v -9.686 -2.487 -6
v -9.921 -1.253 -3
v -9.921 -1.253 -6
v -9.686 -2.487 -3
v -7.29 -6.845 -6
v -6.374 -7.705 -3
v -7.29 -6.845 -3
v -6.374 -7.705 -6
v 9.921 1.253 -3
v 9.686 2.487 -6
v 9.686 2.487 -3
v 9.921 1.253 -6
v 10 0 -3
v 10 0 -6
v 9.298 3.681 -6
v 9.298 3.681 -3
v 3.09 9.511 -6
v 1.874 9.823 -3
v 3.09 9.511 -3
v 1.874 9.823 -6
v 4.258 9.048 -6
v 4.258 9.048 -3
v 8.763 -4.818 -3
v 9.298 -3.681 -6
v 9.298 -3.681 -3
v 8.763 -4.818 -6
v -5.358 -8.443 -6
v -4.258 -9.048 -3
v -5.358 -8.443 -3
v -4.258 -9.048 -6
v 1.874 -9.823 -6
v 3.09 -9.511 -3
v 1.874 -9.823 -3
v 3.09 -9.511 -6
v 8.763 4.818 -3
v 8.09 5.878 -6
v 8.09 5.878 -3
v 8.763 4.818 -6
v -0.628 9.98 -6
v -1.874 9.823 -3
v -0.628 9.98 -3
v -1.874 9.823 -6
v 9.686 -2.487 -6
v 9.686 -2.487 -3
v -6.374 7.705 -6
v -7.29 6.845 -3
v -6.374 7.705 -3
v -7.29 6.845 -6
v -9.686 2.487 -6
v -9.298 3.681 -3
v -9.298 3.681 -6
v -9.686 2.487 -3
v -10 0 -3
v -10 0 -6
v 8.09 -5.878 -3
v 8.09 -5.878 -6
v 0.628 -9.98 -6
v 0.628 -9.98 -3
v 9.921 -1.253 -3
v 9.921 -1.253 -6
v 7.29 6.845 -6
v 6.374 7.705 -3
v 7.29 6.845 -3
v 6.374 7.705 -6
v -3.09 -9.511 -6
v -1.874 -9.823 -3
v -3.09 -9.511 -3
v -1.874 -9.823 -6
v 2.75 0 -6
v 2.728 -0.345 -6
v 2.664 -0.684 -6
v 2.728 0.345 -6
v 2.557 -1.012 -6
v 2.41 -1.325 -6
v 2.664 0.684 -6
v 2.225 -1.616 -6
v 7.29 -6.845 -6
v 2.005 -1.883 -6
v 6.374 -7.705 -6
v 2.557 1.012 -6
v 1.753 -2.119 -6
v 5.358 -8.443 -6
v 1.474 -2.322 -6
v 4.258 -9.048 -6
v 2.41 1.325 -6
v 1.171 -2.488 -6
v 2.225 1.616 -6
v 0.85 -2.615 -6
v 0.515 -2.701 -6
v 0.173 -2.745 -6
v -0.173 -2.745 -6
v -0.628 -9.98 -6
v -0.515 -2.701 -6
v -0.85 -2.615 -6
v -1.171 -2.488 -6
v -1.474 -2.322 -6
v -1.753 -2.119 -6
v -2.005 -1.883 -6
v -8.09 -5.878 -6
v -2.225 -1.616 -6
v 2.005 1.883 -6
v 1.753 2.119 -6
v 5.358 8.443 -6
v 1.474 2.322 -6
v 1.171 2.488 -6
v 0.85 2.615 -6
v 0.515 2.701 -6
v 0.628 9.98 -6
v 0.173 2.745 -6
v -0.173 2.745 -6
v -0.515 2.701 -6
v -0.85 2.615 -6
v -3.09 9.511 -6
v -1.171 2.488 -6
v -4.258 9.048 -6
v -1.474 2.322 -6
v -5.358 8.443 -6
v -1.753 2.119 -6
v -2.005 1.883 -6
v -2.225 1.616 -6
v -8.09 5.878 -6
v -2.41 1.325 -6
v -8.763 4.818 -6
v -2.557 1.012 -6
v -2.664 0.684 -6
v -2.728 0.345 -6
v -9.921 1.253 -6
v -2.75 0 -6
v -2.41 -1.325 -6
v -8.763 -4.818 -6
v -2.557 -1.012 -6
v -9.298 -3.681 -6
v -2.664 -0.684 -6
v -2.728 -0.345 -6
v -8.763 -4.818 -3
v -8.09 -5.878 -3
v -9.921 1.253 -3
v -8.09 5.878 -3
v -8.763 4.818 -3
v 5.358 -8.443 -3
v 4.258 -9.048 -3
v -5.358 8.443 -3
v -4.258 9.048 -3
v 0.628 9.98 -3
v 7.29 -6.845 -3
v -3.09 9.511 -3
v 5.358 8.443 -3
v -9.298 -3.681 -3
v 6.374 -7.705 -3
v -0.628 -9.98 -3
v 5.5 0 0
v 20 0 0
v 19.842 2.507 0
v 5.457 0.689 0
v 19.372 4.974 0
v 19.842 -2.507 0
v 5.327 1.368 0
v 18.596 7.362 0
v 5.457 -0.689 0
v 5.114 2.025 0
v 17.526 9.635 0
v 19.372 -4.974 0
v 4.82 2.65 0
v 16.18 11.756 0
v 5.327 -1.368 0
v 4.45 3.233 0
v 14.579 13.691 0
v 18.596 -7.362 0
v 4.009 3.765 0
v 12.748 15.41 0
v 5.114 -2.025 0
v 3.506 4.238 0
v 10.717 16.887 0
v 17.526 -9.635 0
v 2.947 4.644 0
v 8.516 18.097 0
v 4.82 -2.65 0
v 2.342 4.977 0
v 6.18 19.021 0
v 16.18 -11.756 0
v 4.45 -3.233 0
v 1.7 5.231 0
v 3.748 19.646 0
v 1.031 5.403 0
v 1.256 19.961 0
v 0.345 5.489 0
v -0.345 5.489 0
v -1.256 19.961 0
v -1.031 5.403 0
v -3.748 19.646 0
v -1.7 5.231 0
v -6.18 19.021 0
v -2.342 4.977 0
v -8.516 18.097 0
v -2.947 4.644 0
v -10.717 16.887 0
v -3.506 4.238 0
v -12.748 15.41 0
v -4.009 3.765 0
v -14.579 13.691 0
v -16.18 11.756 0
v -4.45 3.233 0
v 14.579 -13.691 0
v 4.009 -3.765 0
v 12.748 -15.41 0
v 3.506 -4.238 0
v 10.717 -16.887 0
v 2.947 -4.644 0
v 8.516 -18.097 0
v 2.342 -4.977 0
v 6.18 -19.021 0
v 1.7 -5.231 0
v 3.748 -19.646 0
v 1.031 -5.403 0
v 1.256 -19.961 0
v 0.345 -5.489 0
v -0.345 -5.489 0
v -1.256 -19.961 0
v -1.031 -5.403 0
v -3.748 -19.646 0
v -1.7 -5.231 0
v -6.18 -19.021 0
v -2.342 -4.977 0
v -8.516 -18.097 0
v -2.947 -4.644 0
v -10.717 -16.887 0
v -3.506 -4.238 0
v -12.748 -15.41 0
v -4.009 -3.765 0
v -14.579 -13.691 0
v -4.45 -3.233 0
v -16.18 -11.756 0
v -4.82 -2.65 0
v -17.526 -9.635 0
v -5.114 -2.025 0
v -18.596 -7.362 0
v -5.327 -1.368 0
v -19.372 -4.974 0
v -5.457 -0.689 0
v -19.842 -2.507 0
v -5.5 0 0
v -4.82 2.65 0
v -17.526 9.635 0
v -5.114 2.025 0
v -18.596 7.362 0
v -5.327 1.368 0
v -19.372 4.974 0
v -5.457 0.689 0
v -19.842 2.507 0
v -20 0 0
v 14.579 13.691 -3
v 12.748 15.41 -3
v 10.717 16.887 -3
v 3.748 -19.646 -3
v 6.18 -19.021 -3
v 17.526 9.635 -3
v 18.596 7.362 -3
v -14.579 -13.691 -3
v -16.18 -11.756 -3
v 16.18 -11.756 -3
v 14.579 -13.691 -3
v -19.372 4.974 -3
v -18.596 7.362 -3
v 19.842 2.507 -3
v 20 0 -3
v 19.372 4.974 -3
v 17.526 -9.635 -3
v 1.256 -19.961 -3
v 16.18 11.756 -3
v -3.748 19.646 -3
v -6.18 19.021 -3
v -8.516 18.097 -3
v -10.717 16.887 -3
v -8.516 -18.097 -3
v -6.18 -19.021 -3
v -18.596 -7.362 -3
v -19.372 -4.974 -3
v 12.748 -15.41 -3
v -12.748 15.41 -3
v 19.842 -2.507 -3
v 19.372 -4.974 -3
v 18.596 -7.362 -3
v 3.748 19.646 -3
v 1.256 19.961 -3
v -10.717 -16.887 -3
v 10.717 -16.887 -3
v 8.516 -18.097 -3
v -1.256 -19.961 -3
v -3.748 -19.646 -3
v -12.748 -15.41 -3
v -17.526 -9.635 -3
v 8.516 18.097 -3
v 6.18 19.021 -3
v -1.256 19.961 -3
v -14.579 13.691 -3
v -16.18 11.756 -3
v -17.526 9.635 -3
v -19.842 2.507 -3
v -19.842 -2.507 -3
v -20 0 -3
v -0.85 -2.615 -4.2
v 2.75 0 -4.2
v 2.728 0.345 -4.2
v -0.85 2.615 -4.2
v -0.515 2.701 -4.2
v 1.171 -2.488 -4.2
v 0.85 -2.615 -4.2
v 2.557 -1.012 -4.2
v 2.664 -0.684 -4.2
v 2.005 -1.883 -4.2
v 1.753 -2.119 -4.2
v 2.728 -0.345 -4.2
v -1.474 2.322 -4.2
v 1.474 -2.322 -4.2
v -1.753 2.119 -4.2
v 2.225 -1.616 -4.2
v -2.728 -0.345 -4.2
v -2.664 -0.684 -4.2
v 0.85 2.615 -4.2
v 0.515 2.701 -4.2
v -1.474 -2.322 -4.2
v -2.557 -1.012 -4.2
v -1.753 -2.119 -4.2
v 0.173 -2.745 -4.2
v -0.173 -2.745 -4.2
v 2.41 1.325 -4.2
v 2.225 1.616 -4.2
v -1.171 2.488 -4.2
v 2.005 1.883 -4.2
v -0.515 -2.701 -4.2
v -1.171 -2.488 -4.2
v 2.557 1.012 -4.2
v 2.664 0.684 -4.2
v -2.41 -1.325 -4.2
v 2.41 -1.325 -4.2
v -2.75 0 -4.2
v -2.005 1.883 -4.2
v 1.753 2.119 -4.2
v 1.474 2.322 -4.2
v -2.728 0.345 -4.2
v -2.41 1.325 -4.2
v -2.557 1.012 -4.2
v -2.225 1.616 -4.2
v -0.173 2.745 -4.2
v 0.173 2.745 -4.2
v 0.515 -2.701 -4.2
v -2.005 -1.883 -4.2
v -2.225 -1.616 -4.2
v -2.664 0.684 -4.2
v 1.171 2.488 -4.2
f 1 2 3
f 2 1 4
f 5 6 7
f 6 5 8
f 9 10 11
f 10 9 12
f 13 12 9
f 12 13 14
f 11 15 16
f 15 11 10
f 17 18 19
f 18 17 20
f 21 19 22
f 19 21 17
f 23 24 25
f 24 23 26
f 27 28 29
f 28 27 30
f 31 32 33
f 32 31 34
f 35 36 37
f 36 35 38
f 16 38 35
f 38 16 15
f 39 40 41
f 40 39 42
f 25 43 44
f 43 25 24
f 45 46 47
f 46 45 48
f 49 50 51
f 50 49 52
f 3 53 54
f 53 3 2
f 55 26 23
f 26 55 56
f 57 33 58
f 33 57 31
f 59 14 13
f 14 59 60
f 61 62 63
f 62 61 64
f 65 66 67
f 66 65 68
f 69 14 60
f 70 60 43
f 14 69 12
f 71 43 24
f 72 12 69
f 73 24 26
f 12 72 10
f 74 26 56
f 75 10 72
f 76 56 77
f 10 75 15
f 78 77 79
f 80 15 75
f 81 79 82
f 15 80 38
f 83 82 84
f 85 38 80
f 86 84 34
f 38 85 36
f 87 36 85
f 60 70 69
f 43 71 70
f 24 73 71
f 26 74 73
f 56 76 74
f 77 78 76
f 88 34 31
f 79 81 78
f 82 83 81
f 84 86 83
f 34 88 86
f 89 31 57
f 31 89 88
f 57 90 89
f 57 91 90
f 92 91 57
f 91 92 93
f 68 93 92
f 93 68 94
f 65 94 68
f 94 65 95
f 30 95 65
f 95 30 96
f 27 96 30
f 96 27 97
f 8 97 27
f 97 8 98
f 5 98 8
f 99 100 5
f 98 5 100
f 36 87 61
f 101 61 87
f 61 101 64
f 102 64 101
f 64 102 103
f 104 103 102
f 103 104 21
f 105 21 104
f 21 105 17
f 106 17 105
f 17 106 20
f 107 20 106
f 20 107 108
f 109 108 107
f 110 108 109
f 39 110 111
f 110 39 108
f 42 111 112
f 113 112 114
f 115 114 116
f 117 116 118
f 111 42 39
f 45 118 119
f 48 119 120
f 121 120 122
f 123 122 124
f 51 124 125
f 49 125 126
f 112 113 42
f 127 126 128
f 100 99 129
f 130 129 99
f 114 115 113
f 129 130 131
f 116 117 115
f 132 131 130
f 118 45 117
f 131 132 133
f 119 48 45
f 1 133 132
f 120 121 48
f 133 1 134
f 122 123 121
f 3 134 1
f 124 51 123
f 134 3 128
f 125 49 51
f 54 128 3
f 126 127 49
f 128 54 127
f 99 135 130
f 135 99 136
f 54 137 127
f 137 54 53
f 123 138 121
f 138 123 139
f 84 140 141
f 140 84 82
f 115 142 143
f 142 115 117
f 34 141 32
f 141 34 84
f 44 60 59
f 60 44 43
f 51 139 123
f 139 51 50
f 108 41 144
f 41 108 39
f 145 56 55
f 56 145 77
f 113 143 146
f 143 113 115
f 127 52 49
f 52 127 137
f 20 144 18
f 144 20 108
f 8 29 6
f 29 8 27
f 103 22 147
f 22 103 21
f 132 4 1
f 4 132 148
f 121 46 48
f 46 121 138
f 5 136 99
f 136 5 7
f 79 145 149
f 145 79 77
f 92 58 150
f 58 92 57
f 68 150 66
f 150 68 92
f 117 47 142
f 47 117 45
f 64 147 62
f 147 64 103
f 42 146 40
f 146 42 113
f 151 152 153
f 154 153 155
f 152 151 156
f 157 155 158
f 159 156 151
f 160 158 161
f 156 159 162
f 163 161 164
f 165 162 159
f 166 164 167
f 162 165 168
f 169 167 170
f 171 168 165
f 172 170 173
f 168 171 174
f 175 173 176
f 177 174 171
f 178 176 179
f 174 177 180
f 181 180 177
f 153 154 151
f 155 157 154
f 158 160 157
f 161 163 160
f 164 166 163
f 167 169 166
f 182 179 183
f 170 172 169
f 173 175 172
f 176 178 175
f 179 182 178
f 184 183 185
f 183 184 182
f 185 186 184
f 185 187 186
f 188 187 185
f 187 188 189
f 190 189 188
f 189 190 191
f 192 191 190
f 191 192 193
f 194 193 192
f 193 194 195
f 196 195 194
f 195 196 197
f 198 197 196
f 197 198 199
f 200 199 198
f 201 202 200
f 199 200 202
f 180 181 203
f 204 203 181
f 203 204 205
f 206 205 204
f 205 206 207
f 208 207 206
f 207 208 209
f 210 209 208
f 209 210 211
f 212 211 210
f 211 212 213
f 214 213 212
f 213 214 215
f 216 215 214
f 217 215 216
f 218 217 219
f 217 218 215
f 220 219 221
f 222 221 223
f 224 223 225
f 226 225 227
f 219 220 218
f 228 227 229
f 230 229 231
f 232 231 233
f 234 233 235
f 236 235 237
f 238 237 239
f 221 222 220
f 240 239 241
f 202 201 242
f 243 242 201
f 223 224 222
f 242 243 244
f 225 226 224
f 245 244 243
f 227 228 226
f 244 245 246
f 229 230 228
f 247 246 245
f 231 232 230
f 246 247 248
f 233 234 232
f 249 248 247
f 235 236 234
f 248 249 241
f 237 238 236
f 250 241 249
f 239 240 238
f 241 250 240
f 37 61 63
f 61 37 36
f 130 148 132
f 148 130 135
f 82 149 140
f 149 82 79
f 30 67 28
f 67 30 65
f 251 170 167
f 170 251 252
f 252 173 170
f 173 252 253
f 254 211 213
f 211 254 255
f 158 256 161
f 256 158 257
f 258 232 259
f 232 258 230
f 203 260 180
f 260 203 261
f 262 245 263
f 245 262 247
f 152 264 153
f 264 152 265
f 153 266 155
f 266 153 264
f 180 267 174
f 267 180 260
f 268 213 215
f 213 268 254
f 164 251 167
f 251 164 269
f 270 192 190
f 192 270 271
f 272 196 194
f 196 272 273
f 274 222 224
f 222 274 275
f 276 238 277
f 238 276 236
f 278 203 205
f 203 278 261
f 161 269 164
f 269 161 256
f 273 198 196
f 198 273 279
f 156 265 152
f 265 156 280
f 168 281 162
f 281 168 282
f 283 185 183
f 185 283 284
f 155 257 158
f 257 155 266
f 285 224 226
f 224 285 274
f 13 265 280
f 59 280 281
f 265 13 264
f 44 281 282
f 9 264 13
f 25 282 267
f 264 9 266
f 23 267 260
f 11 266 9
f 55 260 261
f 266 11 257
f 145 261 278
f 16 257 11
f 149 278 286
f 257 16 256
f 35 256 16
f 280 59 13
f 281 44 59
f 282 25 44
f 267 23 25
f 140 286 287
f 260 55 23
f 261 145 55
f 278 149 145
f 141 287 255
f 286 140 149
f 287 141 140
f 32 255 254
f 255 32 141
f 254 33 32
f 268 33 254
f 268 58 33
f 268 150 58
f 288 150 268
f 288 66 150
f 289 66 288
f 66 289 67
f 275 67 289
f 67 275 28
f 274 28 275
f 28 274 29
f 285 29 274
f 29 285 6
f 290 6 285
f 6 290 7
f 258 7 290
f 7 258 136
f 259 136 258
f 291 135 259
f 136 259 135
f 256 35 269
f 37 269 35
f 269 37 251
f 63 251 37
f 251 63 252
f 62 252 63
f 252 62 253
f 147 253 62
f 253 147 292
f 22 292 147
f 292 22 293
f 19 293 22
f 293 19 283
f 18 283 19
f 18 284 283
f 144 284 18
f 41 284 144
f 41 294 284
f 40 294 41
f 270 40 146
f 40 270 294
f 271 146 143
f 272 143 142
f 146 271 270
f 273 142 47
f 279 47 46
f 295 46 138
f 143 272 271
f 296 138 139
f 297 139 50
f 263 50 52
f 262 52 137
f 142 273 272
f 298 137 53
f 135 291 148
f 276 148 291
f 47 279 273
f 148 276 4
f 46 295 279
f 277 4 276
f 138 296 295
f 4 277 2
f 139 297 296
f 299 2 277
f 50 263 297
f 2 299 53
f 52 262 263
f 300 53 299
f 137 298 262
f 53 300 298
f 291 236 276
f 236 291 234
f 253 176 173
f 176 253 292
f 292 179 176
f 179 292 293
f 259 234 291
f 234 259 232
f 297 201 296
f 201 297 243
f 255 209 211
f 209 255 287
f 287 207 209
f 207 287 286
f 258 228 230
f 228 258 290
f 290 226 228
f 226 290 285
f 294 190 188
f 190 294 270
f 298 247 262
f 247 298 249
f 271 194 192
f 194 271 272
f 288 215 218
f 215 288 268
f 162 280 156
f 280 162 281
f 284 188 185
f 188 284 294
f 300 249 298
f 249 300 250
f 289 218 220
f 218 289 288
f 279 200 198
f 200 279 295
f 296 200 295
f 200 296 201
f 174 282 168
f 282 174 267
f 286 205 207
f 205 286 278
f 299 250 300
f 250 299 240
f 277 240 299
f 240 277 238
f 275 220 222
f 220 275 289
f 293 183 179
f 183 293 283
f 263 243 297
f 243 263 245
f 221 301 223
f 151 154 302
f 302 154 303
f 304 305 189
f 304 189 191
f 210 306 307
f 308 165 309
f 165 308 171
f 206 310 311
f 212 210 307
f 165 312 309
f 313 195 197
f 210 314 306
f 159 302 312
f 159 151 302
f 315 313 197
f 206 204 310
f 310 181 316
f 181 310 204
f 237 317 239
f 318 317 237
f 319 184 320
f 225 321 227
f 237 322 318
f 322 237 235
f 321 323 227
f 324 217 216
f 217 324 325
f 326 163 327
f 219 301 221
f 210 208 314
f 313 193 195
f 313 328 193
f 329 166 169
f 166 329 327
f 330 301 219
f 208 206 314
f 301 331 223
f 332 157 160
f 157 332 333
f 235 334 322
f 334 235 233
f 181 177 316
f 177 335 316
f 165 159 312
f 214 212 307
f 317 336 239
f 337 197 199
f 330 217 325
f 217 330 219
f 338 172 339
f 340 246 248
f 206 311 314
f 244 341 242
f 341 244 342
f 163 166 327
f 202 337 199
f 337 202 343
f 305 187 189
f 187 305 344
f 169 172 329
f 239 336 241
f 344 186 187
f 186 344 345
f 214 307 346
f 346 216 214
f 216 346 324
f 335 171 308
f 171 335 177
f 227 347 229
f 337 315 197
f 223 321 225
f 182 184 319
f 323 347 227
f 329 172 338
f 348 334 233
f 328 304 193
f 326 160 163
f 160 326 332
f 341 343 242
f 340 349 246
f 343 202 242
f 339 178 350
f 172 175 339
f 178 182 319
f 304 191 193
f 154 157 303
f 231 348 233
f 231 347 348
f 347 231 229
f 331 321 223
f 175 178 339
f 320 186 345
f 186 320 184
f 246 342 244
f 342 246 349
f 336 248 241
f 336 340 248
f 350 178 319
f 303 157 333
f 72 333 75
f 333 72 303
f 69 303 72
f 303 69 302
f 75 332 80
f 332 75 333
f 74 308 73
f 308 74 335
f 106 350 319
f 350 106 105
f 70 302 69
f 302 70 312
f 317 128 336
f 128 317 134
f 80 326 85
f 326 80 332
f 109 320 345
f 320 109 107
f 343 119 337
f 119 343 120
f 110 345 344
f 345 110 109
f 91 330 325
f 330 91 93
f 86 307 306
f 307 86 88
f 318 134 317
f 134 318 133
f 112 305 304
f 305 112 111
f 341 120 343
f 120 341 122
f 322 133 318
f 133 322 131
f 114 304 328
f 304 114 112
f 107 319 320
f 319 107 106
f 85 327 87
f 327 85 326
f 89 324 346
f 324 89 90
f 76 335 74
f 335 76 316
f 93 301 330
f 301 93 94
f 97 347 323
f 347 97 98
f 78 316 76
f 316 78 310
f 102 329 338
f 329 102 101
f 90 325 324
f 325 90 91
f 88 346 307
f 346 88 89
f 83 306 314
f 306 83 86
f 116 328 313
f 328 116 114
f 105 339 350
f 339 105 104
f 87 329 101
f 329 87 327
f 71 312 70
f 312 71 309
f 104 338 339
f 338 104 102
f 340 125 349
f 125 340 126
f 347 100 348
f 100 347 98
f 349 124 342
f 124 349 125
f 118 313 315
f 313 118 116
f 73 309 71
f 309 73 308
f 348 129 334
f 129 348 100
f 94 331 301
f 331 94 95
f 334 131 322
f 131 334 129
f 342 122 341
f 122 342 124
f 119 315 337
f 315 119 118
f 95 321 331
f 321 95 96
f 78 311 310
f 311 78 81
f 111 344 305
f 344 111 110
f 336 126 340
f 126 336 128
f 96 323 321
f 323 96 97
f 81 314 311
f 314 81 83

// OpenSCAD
$fn = 50;


difference() {
	union() {
		translate(v = [0, 0, -6.0000000000]) {
			cylinder(h = 6, r = 10.0000000000);
		}
		translate(v = [0, 0, -3.0000000000]) {
			cylinder(h = 3, r = 20.0000000000);
		}
	}
	union() {
		translate(v = [0, 0, 0]) {
			rotate(a = [0, 0, 0]) {
				difference() {
					union() {
						#translate(v = [0, 0, -6.0000000000]) {
							cylinder(h = 6, r = 2.2500000000);
						}
						#translate(v = [0, 0, -4.2000000000]) {
							cylinder(h = 4.2000000000, r = 10.0000000000, r1 = 2.7500000000, r2 = 5.5000000000);
						}
						#translate(v = [0, 0, -6.0000000000]) {
							cylinder(h = 6, r = 2.7500000000);
						}
						#translate(v = [0, 0, -6.0000000000]) {
							cylinder(h = 6, r = 2.2500000000);
						}
					}
					union();
				}
			}
		}
	}
}
